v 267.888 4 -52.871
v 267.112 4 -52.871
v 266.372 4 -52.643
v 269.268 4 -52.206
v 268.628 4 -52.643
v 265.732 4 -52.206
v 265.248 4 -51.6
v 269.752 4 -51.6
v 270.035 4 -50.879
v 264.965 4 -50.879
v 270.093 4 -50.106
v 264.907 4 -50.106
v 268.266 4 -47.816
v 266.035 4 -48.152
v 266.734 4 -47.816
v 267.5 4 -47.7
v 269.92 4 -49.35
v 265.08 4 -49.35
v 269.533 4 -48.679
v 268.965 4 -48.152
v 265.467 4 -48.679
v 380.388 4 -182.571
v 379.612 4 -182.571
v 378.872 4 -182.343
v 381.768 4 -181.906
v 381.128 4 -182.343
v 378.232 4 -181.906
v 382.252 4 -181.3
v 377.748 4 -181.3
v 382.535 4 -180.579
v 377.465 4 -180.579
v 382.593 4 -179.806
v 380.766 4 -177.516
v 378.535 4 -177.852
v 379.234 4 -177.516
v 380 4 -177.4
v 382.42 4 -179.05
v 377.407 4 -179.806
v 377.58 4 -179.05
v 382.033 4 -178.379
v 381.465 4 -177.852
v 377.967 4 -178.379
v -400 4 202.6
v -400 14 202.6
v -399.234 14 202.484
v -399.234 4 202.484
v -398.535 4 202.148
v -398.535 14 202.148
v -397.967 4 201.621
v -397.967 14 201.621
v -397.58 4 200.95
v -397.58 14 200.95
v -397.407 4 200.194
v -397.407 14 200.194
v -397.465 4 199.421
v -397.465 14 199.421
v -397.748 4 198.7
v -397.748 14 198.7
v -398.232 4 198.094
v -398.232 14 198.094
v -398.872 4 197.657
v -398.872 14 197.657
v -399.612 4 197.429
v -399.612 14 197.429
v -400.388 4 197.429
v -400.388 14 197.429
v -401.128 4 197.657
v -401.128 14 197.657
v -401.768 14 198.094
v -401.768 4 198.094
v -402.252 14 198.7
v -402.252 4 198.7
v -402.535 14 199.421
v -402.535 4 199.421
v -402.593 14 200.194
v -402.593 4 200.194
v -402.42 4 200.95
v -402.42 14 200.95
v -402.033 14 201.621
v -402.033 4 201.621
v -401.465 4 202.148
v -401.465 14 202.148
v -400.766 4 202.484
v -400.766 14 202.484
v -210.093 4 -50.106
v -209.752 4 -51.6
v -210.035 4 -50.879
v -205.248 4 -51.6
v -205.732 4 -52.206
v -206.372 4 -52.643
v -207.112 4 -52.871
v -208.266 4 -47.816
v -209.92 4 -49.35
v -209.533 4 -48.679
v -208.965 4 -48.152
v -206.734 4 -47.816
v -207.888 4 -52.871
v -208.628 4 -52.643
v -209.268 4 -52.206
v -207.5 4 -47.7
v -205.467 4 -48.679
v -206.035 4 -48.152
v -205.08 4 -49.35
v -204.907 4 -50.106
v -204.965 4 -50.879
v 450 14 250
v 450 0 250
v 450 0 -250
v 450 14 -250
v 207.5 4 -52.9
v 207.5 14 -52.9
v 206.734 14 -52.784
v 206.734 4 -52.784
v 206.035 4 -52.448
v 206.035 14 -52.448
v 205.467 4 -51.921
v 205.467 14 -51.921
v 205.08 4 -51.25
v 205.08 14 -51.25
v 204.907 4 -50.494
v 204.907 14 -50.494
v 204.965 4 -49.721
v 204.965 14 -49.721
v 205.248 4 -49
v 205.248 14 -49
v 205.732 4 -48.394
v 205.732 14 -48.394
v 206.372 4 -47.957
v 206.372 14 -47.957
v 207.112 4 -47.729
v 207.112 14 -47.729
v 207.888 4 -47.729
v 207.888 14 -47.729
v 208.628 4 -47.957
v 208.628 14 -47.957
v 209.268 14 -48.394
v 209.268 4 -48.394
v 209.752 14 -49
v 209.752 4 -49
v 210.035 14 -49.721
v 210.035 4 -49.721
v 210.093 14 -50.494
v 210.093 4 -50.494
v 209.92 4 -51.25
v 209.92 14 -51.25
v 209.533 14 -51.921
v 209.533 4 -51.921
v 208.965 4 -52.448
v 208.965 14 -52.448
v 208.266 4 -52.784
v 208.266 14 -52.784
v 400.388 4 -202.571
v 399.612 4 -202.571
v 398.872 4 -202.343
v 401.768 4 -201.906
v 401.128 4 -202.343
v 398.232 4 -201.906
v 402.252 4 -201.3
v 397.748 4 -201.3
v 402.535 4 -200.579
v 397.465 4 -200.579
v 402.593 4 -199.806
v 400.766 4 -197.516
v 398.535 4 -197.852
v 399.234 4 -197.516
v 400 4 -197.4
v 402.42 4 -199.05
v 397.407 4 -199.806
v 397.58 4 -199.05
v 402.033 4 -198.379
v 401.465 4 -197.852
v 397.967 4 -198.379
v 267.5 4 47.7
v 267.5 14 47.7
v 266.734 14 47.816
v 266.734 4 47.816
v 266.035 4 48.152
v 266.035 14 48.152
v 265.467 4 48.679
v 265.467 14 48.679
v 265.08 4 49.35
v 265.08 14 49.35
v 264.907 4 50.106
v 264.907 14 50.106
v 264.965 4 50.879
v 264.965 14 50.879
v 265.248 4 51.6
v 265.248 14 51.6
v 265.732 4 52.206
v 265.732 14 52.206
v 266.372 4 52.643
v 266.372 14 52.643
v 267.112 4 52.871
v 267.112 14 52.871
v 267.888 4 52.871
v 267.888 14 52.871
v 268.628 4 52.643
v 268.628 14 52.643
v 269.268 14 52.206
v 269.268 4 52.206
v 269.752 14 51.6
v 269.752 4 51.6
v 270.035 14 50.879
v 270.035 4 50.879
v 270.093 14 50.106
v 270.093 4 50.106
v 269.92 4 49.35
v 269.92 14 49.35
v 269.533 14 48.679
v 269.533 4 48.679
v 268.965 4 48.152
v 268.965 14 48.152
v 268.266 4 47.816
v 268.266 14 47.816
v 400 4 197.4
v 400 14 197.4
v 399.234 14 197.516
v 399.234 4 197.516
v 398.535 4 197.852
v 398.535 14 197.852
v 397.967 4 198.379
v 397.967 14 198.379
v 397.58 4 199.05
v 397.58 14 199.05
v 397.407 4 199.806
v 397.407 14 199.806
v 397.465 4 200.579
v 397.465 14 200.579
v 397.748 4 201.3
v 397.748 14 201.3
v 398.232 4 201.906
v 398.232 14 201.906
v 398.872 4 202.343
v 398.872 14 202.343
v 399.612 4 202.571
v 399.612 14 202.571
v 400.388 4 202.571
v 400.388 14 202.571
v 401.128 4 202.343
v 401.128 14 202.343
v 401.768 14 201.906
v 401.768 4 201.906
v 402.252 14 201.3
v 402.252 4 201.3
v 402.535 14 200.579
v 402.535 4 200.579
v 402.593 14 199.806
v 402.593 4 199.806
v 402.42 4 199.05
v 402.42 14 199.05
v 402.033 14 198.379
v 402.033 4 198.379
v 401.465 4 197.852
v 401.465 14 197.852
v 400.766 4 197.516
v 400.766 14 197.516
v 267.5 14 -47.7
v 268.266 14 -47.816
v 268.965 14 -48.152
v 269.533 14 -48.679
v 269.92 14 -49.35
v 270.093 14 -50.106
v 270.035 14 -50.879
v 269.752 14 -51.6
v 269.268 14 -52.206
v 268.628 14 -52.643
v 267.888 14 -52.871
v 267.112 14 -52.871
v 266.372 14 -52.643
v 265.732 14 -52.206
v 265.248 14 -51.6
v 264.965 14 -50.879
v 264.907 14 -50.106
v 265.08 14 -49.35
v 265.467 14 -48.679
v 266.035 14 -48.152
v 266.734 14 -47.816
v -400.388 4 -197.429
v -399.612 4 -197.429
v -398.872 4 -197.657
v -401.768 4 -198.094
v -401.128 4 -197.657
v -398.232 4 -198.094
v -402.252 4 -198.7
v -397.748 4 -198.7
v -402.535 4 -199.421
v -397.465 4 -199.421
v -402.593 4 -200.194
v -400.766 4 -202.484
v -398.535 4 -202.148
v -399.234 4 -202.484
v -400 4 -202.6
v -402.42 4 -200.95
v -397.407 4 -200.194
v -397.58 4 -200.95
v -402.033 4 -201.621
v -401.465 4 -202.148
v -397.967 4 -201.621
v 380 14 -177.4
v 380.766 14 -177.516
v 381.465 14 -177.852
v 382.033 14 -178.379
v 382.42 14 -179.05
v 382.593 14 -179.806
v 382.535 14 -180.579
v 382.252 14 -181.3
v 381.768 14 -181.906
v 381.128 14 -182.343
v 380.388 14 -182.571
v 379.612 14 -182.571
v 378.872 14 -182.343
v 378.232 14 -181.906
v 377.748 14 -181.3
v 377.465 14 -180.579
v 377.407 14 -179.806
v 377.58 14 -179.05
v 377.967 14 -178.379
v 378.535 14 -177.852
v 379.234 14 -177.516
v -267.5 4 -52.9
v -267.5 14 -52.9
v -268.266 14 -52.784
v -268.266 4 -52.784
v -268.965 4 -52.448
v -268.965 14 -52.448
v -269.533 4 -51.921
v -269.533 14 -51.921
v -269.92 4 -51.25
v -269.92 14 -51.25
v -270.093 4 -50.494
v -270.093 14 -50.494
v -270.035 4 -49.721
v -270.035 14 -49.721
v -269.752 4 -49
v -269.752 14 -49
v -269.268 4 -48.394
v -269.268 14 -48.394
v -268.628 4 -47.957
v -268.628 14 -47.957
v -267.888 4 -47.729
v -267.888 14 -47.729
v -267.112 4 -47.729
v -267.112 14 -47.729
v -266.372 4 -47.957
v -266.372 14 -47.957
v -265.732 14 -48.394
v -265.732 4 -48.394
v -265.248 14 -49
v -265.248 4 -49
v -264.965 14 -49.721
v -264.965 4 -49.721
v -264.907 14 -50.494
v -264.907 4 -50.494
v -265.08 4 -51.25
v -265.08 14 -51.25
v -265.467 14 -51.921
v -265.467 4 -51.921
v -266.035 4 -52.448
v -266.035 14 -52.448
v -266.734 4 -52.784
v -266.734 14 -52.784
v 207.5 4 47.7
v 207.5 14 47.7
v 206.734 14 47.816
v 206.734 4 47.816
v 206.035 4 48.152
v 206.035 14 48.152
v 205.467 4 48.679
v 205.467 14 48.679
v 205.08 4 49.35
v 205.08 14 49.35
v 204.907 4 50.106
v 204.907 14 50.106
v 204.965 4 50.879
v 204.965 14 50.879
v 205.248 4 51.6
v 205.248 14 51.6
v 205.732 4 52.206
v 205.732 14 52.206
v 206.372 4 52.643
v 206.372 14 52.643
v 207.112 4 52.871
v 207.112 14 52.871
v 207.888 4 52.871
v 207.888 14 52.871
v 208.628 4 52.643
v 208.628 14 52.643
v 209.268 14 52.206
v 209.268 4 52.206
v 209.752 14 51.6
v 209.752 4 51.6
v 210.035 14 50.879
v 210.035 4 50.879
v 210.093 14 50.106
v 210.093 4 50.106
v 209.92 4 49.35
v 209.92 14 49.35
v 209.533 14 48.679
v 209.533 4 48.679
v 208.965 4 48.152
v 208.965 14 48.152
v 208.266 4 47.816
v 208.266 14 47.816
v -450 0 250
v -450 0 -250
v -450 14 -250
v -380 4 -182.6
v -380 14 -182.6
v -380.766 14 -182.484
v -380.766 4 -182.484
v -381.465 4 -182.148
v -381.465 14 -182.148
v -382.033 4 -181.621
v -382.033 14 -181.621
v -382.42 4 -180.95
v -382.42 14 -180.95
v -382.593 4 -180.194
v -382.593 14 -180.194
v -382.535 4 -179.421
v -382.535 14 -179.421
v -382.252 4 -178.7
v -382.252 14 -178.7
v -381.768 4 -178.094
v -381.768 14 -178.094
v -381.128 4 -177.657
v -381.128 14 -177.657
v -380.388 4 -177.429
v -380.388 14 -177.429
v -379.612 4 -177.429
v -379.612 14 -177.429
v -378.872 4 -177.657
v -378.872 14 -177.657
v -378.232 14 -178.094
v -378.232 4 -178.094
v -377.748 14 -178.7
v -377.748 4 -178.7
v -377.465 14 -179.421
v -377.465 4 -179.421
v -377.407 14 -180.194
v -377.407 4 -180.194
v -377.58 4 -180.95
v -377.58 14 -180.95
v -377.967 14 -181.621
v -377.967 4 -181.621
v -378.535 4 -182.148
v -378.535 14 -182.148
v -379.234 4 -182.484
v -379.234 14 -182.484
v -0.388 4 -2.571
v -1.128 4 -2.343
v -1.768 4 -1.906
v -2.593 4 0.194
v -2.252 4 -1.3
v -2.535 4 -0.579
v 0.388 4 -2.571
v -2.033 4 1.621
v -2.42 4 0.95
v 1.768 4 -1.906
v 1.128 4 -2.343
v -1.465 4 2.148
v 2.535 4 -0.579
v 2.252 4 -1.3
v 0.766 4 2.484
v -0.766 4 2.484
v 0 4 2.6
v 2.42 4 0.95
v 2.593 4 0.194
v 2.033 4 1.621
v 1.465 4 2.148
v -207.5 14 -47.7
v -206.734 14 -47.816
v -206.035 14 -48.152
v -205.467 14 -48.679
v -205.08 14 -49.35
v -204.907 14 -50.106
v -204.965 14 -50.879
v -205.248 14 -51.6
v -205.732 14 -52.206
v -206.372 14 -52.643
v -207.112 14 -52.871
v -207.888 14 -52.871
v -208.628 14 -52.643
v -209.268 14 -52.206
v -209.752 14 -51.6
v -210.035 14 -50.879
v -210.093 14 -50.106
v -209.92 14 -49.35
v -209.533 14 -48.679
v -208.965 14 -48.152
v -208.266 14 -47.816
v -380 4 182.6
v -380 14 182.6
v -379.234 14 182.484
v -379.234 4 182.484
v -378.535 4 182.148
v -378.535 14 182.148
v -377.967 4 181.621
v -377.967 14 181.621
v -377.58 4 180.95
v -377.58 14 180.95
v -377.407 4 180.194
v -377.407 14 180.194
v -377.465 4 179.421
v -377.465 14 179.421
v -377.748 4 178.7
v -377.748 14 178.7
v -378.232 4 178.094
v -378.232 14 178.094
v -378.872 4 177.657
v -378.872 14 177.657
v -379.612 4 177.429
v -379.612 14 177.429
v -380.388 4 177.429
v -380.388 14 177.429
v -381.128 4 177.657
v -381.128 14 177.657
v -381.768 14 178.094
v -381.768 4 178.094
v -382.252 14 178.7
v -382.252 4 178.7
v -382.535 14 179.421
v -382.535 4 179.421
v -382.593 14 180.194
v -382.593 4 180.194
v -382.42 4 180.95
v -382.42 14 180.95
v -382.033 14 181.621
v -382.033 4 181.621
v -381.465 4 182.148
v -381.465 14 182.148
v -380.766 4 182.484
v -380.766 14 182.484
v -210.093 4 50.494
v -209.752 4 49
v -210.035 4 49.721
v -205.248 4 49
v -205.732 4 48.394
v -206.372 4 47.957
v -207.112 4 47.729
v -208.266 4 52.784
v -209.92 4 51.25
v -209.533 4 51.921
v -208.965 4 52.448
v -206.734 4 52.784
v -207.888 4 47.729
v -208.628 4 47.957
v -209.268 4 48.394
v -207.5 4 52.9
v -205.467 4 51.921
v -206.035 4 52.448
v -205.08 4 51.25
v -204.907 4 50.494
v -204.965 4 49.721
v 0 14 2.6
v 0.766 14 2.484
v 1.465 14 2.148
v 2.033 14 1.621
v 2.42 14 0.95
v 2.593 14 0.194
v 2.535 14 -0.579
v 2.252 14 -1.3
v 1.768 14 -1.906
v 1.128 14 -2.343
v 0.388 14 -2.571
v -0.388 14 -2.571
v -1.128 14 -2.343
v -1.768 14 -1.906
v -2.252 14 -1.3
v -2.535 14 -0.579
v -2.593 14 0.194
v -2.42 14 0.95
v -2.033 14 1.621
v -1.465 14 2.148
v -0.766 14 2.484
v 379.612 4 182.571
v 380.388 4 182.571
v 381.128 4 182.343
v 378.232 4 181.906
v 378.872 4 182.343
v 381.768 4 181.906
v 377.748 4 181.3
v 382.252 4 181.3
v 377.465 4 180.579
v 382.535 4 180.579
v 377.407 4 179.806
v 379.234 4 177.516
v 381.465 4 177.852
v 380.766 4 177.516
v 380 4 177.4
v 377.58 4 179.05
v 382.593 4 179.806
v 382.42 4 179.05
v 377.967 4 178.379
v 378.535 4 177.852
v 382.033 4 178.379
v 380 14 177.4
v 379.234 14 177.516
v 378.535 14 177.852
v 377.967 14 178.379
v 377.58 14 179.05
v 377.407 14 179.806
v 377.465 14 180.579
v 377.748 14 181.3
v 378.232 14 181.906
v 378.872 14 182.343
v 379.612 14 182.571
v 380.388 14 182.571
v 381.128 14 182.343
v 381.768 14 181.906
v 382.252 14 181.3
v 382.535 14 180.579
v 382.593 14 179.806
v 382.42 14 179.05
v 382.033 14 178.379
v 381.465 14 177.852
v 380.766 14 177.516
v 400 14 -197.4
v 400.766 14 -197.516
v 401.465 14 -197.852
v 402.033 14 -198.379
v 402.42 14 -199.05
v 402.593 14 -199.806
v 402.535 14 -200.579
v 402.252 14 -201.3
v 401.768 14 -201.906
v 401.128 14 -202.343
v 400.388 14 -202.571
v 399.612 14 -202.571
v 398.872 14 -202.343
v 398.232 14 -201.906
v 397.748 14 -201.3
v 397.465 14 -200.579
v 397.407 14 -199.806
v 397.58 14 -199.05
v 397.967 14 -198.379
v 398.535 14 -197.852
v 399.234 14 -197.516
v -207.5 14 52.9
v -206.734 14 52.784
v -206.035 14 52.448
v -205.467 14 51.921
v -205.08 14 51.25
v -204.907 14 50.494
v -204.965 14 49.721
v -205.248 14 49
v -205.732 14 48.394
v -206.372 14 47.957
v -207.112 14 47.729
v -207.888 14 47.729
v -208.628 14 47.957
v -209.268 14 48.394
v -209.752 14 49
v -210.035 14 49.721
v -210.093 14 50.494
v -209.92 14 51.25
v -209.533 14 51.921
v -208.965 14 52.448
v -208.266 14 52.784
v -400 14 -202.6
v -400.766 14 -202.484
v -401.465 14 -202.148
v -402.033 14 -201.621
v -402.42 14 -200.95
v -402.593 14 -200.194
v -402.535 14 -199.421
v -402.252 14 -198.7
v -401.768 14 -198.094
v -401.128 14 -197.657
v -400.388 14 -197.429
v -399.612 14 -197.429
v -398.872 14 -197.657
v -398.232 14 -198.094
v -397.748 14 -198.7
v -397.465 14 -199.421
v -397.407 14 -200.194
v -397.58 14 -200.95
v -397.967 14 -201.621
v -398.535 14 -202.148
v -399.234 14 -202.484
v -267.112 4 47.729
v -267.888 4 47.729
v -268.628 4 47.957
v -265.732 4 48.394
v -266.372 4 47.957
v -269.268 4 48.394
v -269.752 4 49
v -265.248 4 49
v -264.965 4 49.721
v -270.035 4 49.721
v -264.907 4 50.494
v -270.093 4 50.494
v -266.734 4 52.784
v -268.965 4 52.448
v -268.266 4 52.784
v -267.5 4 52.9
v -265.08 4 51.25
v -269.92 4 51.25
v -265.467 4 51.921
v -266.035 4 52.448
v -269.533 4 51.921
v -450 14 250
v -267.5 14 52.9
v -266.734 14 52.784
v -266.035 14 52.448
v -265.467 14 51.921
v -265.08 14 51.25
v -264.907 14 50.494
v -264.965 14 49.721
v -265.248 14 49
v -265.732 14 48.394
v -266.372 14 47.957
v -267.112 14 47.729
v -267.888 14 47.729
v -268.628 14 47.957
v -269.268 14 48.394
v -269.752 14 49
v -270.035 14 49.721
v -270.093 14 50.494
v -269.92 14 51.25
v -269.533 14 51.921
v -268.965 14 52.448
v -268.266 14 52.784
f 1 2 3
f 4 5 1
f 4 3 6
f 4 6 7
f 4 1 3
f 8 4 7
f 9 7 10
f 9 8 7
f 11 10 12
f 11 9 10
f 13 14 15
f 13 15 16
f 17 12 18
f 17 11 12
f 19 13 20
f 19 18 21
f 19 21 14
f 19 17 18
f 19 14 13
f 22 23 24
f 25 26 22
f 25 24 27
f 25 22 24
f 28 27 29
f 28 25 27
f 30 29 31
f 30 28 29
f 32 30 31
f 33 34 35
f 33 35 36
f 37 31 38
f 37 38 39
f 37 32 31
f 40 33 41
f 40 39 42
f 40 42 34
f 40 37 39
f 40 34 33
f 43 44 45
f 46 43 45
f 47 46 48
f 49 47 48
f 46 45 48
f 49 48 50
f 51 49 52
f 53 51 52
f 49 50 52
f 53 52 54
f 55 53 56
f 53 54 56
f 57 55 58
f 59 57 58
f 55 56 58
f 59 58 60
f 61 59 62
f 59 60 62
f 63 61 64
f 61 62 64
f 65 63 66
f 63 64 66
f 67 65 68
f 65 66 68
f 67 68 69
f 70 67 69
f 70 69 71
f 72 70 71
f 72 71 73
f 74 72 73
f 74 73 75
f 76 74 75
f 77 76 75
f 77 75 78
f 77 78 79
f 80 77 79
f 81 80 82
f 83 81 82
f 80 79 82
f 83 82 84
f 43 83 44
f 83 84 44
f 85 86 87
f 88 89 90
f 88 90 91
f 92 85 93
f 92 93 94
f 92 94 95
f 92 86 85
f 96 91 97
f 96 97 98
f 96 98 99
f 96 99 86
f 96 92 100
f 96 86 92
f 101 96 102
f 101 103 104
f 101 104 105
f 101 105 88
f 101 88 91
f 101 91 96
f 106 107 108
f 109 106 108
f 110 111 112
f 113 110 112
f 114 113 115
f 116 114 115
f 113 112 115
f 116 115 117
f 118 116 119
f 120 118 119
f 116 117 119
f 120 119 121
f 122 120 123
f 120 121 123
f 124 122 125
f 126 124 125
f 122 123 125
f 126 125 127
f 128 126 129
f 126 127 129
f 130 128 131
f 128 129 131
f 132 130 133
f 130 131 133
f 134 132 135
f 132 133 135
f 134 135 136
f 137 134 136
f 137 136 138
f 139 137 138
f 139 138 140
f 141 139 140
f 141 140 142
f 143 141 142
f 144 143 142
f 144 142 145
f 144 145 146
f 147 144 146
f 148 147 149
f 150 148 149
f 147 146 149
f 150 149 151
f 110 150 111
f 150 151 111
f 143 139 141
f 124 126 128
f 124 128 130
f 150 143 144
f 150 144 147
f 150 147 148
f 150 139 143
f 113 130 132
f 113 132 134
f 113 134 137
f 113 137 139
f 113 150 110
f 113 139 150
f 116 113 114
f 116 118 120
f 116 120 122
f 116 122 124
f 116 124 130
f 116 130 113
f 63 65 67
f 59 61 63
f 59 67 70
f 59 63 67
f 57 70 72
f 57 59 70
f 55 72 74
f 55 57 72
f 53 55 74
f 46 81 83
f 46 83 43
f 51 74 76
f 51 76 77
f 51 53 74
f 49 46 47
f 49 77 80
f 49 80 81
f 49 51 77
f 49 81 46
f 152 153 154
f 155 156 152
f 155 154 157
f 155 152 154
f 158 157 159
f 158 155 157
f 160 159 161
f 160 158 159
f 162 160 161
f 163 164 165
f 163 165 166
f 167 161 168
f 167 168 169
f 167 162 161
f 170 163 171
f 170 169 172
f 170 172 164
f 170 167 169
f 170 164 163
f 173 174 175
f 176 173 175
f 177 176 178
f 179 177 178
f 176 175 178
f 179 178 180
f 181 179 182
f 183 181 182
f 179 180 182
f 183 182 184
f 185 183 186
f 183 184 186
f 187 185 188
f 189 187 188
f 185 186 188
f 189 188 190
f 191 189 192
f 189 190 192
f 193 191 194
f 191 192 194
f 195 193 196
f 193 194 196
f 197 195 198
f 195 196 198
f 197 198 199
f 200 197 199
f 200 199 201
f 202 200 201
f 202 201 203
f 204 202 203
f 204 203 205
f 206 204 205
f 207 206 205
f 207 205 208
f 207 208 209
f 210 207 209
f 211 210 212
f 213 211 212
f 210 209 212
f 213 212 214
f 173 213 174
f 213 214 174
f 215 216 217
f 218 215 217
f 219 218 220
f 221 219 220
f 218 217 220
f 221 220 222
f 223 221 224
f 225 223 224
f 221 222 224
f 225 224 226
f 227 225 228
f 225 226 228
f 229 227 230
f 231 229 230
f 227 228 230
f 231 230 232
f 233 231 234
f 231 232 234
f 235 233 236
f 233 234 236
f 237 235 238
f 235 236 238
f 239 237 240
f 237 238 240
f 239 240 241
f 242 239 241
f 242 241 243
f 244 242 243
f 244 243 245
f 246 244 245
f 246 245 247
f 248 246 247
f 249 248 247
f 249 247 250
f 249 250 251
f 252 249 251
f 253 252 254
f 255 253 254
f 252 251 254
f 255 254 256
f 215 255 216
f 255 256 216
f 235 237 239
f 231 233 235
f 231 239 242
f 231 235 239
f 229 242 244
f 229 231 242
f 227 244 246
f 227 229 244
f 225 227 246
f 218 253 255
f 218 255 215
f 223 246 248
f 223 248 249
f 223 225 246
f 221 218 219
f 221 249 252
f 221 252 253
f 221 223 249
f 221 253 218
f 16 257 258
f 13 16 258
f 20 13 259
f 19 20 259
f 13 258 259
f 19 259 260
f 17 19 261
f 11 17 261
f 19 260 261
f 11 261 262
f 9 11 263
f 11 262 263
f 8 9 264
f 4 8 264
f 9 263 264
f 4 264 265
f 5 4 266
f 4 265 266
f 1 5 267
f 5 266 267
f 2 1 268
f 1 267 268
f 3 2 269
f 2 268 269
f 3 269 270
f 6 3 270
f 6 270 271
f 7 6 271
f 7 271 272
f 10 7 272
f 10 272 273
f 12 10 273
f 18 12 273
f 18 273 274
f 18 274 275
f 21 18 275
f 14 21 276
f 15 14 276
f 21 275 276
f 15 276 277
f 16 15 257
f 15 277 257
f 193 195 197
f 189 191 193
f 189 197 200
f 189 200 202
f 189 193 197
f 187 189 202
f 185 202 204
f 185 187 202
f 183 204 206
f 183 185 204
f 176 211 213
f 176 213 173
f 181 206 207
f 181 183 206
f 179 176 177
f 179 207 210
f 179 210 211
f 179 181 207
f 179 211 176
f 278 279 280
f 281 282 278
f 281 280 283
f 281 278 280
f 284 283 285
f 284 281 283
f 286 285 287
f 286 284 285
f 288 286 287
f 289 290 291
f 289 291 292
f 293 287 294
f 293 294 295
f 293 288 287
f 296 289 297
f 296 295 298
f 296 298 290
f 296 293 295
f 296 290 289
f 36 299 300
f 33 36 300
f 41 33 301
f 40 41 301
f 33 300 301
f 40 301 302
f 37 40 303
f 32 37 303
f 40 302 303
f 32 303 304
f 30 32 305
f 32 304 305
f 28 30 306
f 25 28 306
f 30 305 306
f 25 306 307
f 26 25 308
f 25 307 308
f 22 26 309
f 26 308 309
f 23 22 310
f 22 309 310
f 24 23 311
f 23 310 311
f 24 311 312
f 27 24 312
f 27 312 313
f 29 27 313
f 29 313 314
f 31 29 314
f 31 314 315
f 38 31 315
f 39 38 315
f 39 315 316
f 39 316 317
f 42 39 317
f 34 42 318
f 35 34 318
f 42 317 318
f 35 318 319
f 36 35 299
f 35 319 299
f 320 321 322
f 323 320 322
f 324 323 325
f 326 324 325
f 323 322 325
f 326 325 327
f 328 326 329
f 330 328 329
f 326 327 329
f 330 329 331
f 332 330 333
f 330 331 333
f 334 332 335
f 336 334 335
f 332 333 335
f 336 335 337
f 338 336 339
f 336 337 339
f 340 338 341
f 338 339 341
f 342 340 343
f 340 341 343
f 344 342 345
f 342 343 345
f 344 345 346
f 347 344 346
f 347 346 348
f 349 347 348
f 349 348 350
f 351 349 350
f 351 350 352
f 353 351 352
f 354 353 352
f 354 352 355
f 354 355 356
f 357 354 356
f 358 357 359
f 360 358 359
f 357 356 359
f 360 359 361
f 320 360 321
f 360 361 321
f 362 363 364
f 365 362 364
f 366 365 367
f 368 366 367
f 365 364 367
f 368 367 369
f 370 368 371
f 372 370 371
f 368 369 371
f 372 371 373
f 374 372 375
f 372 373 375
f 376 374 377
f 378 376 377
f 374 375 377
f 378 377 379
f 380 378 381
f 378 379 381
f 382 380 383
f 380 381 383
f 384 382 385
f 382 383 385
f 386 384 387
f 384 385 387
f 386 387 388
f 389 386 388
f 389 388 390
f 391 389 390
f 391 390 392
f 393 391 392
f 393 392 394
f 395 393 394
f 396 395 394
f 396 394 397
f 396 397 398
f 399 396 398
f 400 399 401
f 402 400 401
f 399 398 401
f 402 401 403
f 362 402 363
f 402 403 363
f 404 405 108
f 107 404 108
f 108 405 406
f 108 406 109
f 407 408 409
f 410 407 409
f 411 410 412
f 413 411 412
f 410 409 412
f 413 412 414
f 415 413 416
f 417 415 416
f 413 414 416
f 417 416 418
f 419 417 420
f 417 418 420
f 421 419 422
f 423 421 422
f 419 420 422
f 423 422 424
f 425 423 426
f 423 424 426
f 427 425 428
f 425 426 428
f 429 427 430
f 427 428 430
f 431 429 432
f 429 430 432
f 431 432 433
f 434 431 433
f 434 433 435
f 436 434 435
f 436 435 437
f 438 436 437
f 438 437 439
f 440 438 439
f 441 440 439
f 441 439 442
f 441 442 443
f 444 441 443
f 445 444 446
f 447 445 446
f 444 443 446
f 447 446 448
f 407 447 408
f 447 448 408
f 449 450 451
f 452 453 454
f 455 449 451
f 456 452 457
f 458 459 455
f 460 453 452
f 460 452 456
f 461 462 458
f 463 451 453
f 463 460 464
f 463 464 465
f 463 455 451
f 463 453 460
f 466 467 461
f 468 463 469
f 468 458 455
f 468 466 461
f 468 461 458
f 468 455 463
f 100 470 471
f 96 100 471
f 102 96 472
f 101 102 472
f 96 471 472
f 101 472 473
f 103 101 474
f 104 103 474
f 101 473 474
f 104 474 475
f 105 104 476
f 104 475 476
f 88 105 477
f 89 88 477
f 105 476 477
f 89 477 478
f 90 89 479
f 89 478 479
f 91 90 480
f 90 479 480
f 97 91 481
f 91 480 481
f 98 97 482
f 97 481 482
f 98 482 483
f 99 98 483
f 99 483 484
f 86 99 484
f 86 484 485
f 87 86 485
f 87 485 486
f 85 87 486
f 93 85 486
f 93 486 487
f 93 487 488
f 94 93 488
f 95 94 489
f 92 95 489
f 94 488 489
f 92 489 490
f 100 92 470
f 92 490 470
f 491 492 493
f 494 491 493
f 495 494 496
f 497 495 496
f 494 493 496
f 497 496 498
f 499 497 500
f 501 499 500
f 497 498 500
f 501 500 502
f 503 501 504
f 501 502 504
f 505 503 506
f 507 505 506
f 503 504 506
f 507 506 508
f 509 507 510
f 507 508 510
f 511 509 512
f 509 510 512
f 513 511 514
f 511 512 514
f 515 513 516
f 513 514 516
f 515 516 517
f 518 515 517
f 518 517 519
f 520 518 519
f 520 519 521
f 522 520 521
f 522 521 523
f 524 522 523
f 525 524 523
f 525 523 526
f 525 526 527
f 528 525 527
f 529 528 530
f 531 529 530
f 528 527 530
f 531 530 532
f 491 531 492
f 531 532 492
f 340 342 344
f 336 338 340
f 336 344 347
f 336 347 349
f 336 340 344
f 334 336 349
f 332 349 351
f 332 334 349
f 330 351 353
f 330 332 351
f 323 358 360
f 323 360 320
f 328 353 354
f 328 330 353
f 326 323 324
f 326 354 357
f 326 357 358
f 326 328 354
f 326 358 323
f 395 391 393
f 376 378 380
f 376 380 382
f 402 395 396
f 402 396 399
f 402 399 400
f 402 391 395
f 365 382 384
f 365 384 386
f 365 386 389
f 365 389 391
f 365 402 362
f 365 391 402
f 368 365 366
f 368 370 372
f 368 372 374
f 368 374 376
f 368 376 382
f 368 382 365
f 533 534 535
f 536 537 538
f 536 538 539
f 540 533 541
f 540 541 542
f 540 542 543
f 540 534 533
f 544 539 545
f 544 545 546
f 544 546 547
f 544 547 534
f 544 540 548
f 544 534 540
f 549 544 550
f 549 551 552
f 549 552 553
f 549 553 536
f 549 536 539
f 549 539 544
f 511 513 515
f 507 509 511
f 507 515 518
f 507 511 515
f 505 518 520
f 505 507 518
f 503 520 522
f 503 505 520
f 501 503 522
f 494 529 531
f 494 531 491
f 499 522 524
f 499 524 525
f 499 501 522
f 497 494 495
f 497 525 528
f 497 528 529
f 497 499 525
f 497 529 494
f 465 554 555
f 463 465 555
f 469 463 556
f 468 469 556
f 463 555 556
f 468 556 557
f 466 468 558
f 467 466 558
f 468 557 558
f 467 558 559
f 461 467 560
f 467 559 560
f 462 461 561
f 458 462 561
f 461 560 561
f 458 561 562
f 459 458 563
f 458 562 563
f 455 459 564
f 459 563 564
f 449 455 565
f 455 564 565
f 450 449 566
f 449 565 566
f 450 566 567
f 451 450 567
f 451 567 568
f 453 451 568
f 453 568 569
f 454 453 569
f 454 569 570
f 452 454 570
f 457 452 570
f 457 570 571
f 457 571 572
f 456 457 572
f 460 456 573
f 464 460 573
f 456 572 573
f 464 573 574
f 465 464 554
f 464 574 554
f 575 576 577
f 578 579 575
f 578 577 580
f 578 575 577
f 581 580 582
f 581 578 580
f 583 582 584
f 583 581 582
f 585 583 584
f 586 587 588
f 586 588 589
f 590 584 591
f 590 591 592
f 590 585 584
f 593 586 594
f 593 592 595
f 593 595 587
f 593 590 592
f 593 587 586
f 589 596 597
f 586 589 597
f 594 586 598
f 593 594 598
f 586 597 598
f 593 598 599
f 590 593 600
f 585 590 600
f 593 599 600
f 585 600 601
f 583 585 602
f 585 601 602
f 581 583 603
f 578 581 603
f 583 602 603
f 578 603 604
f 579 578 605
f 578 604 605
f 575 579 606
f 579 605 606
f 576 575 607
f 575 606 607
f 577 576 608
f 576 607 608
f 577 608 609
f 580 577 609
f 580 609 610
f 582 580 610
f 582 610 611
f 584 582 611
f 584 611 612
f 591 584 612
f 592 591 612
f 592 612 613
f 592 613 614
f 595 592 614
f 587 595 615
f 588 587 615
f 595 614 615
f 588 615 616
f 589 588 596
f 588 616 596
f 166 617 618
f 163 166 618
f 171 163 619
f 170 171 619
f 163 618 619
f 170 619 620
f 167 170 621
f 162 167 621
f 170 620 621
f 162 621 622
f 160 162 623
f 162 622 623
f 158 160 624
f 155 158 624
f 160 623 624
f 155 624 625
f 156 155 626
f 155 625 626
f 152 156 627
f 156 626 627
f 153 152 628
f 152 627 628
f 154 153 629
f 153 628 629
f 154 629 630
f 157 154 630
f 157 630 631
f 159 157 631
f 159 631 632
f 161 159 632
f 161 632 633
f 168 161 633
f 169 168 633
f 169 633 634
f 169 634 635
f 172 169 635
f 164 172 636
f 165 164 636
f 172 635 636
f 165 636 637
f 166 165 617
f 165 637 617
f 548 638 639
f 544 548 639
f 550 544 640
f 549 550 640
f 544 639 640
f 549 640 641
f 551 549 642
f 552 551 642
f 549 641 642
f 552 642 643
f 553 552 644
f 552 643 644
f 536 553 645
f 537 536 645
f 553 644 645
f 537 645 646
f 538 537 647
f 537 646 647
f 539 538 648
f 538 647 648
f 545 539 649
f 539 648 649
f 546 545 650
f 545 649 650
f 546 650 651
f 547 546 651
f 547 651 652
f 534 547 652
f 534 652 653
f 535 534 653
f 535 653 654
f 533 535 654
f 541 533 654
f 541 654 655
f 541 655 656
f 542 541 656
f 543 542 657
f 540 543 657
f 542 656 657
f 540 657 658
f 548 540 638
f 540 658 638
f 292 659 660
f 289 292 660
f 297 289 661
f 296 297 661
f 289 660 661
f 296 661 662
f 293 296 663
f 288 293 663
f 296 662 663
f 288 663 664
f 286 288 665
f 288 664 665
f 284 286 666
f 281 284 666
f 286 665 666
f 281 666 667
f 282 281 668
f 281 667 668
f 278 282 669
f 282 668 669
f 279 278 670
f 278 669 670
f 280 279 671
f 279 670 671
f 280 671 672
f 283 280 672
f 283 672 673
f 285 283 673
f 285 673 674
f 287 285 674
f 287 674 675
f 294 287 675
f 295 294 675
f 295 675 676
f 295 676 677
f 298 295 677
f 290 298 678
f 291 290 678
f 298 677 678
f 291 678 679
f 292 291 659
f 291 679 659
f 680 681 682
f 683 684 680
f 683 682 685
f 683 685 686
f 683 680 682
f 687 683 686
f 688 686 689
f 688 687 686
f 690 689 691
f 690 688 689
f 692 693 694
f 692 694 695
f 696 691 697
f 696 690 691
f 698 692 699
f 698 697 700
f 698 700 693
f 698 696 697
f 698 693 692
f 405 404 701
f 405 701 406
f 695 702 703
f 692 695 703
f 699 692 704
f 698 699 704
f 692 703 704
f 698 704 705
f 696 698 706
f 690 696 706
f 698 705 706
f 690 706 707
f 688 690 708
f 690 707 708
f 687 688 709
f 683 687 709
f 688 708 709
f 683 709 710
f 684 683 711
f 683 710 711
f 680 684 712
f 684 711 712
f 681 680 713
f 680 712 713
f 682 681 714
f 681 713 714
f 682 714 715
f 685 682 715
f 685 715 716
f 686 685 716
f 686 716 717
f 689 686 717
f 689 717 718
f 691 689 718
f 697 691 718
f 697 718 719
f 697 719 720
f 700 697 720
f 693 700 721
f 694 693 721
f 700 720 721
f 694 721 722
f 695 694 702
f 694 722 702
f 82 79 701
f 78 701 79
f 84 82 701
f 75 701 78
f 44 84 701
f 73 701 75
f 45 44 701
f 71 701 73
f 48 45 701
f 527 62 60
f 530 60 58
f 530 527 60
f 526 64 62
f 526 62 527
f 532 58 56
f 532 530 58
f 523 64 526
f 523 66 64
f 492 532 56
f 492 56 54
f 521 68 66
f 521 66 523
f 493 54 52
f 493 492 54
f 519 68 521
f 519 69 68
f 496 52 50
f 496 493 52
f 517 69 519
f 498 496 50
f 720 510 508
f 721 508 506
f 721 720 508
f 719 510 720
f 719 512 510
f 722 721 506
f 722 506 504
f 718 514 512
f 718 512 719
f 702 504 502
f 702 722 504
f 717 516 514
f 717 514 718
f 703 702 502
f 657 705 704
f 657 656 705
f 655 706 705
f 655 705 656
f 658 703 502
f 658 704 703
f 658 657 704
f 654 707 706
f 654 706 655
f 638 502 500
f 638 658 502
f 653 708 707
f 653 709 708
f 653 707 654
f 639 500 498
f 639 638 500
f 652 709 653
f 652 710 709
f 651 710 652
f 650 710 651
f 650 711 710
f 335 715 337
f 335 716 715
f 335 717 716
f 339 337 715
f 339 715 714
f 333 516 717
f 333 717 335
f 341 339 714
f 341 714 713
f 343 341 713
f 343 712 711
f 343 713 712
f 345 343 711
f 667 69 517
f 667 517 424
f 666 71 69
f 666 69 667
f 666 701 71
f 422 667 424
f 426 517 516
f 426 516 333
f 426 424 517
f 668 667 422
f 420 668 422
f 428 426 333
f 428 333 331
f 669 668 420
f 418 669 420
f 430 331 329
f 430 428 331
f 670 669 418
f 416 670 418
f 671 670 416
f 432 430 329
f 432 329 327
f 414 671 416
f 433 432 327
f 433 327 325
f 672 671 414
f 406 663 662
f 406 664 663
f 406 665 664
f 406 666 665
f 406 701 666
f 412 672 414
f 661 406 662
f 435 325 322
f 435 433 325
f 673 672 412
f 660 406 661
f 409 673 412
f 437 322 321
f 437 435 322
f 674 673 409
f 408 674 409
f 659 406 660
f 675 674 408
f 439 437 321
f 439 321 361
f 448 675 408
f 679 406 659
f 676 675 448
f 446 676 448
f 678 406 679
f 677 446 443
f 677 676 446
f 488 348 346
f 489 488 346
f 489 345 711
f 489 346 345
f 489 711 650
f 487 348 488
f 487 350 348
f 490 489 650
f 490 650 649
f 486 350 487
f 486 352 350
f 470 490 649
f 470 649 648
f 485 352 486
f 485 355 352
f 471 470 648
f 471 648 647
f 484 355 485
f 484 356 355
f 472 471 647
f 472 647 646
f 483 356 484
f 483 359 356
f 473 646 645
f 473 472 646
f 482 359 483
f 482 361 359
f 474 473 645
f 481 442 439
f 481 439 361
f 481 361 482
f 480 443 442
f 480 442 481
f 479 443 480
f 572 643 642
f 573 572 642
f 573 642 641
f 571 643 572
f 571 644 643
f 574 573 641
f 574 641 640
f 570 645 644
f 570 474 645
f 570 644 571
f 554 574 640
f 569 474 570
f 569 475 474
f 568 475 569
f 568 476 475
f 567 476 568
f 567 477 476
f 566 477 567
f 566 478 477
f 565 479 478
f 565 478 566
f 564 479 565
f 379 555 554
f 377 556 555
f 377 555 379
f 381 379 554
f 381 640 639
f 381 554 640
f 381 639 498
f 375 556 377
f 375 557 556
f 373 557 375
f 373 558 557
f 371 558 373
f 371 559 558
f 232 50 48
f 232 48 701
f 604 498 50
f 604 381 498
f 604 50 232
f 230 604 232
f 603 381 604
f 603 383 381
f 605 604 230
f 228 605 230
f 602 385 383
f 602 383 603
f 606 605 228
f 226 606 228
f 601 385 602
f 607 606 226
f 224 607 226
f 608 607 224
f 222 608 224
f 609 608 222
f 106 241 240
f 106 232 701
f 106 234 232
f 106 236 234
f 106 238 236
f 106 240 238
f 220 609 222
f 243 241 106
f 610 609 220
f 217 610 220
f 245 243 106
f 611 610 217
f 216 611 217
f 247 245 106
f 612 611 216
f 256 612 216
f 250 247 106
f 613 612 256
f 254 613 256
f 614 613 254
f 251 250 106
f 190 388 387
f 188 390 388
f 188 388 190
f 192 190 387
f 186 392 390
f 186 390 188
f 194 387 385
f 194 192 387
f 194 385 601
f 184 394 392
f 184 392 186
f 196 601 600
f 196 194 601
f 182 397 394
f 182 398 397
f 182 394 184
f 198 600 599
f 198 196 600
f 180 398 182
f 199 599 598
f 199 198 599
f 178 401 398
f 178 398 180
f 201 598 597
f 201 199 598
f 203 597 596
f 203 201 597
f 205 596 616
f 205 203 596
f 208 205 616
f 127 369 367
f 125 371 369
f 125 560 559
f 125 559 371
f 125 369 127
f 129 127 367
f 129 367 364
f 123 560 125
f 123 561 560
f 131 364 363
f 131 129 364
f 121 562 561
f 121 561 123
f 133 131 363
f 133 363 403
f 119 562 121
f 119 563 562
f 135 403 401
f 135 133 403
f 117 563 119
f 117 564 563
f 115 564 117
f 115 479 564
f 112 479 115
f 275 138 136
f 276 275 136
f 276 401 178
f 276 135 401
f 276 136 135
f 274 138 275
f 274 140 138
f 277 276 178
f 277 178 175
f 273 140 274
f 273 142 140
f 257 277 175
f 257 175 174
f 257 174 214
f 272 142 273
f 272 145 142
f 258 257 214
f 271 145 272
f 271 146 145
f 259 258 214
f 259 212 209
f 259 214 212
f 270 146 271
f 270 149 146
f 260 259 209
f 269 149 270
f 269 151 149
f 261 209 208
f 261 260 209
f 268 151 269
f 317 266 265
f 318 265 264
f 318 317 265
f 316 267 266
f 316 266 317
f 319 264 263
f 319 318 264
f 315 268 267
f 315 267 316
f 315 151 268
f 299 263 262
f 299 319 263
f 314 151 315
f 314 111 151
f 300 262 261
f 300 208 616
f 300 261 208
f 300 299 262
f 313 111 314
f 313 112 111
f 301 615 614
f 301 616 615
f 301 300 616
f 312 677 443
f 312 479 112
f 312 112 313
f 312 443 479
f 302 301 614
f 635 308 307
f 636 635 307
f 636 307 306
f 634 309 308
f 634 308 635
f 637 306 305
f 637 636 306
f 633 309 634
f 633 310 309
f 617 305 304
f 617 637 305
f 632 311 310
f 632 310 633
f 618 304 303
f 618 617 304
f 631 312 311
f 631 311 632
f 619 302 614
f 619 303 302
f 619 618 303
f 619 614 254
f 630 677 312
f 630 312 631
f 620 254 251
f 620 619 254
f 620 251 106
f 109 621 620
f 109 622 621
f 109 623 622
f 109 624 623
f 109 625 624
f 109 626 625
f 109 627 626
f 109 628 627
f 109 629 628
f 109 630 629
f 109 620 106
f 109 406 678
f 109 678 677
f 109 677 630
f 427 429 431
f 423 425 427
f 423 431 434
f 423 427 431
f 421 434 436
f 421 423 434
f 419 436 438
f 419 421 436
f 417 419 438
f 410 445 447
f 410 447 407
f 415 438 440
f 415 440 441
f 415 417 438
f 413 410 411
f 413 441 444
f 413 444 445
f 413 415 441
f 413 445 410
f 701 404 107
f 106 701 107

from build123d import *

# Parameters (mm, degrees)
SKETCH1_W           = 900
SKETCH1_H           = 500
BOSS_EXTRUDE1_DEPTH = 14
SKETCH2_R           = 2.6
CUT_EXTRUDE1_DEPTH  = 10


with BuildPart() as part:
    # Sketch1 → Boss-Extrude1 (new body)
    with BuildSketch(Plane(origin=(0, 0, 0), x_dir=(1, 0, 0), z_dir=(0, 1, 0))):
        Rectangle(SKETCH1_W, SKETCH1_H)
    extrude(amount=BOSS_EXTRUDE1_DEPTH)

    # Sketch2 → Cut-Extrude1 (cut)
    with BuildSketch(Plane(origin=(0, 14, 0), x_dir=(1, 0, 0), z_dir=(0, 1, 0))):
        with Locations(Location((-207.5, 50.3, 0), (0, 0, 270))):
            Circle(SKETCH2_R)
        with Locations(Location((-207.5, -50.3, 0), (0, 0, 270))):
            Circle(SKETCH2_R)
        with Locations(Location((0, 0, 0), (0, 0, 270))):
            Circle(SKETCH2_R)
        with Locations(Location((-267.5, -50.3, 0), (0, 0, 270))):
            Circle(SKETCH2_R)
        with Locations(Location((-267.5, 50.3, 0), (0, 0, 90))):
            Circle(SKETCH2_R)
        with Locations(Location((-400, -200, 0), (0, 0, 270))):
            Circle(SKETCH2_R)
        with Locations(Location((-380, -180, 0), (0, 0, 270))):
            Circle(SKETCH2_R)
        with Locations(Location((-380, 180, 0), (0, 0, 90))):
            Circle(SKETCH2_R)
        with Locations(Location((-400, 200, 0), (0, 0, 90))):
            Circle(SKETCH2_R)
        with Locations(Location((400, -200, 0), (0, 0, 90))):
            Circle(SKETCH2_R)
        with Locations(Location((380, -180, 0), (0, 0, 90))):
            Circle(SKETCH2_R)
        with Locations(Location((400, 200, 0), (0, 0, 270))):
            Circle(SKETCH2_R)
        with Locations(Location((380, 180, 0), (0, 0, 270))):
            Circle(SKETCH2_R)
        with Locations(Location((267.5, 50.3, 0), (0, 0, 270))):
            Circle(SKETCH2_R)
        with Locations(Location((267.5, -50.3, 0), (0, 0, 90))):
            Circle(SKETCH2_R)
        with Locations(Location((207.5, -50.3, 0), (0, 0, 90))):
            Circle(SKETCH2_R)
        with Locations(Location((207.5, 50.3, 0), (0, 0, 90))):
            Circle(SKETCH2_R)
    extrude(amount=-CUT_EXTRUDE1_DEPTH, mode=Mode.SUBTRACT)


solid = part.part
